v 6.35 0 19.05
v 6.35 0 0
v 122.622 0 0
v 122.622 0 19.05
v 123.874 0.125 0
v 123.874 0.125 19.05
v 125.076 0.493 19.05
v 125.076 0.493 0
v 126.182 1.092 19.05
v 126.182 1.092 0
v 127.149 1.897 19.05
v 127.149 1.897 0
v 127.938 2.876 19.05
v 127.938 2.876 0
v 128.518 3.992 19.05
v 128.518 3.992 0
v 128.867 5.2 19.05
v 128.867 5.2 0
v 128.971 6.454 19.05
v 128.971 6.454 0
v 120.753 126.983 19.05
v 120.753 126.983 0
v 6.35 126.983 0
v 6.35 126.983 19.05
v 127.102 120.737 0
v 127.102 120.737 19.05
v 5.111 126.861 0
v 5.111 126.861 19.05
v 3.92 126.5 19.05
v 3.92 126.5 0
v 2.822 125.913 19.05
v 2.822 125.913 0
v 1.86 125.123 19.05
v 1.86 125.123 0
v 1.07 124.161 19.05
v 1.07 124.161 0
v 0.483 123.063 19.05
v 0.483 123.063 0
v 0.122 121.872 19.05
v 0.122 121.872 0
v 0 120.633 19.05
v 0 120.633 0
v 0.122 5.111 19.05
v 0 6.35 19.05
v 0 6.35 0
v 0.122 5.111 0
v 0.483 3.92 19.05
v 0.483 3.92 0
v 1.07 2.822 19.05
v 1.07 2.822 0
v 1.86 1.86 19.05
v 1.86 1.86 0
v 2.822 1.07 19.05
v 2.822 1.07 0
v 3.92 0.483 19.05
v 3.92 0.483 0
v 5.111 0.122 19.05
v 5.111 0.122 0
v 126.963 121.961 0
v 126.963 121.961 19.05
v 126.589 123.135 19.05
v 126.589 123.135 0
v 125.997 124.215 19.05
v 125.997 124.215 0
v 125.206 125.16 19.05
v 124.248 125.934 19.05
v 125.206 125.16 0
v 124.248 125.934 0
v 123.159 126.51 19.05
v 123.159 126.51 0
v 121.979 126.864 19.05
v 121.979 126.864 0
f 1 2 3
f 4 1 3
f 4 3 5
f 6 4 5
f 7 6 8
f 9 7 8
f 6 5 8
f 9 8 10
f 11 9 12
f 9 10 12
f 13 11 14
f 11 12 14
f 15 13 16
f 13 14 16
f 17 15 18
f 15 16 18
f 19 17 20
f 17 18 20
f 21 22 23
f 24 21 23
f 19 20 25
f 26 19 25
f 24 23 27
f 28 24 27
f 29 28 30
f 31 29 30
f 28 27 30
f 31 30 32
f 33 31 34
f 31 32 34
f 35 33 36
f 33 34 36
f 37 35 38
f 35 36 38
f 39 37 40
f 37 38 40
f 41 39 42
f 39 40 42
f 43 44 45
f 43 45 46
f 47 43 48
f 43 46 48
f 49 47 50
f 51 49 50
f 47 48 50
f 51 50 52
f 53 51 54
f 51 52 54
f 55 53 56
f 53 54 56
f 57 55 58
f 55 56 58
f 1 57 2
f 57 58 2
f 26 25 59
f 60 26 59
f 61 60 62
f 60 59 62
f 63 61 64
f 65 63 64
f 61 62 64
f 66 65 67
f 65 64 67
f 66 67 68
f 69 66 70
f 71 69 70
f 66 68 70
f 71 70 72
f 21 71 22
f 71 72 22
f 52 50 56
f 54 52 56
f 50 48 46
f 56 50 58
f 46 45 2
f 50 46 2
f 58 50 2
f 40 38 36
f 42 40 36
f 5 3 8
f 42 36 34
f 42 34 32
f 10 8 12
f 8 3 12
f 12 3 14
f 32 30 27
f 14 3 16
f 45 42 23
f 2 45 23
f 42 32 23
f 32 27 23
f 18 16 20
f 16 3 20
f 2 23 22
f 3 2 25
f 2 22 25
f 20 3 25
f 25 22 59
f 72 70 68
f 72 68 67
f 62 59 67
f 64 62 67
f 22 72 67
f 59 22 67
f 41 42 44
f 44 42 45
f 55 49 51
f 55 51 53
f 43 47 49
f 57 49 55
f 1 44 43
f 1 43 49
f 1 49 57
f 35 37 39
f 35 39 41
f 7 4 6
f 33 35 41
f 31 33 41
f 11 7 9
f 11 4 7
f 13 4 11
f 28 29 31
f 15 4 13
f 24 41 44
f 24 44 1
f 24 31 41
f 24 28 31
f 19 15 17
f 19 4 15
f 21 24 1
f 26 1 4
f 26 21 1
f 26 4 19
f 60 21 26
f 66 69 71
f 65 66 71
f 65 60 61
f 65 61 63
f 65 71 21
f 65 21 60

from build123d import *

# Parameters (mm, degrees)
F1_DEPTH = 19.05


with BuildPart() as f1:
    # F0 (on Top) → F1 (new body)
    with BuildSketch(Plane.XY):
        with BuildLine():
            ThreePointArc((0, 6.35), (1.859872, 1.859872), (6.35, 0))
            Line((6.35, 0), (122.622273, 0))
            ThreePointArc((122.622273, 0), (127.148969, 1.89674), (128.971424, 6.453849))
            Line((128.971424, 6.453849), (127.102165, 120.736864))
            ThreePointArc((127.102165, 120.736864), (125.206274, 125.159711), (120.753014, 126.983015))
            Line((120.753014, 126.983015), (6.35, 126.983015))
            ThreePointArc((6.35, 126.983015), (1.859872, 125.123143), (0, 120.633015))
            Line((0, 120.633015), (0, 6.35))
        make_face()
    extrude(amount=F1_DEPTH)


solid = f1.part
